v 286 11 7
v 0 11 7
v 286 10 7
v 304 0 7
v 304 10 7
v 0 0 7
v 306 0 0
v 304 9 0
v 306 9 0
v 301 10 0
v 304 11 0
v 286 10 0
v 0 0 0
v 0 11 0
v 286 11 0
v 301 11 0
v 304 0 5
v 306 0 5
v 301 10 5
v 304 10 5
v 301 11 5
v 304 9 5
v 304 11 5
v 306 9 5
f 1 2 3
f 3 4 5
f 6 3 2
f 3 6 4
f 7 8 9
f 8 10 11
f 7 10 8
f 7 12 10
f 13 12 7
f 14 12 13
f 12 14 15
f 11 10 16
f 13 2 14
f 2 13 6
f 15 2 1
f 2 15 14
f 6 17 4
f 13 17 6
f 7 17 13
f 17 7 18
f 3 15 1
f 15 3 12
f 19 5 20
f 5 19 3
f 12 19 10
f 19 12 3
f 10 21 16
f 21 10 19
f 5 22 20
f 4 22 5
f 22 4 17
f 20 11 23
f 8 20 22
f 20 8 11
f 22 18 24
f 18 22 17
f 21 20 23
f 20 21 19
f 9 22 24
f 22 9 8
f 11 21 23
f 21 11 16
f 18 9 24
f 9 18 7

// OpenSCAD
translate([6.5, 5.5, 3.5]) color([0.3846945959716809, 0.27248481749180187, 0.9711494351721061]) cube([13, 11, 7], center=true);
translate([19.5, 5.5, 3.5]) color([0.5646669518865992, 0.22956269737245216, 0.7165492601952248]) cube([13, 11, 7], center=true);
translate([32.5, 5.5, 3.5]) color([0.5466375027642284, 0.2821670936164109, 0.7398695784196249]) cube([13, 11, 7], center=true);
translate([45.5, 5.5, 3.5]) color([0.9015687423954613, 0.06478718309218656, 0.3075184499818515]) cube([13, 11, 7], center=true);
translate([58.5, 5.5, 3.5]) color([0.32730937178137276, 0.373196919474838, 0.48026967262350795]) cube([13, 11, 7], center=true);
translate([71.5, 5.5, 3.5]) color([0.5820603979481933, 0.1372879505883815, 0.015498761483451418]) cube([13, 11, 7], center=true);
translate([84.5, 5.5, 3.5]) color([0.5048497045627587, 0.36698725510709684, 0.6348155217266559]) cube([13, 11, 7], center=true);
translate([97.5, 5.5, 3.5]) color([0.811995686067811, 0.8768405645756486, 0.1552431358080847]) cube([13, 11, 7], center=true);
translate([110.5, 5.5, 3.5]) color([0.1767648869043179, 0.991228648099722, 0.13558077637136434]) cube([13, 11, 7], center=true);
translate([123.5, 5.5, 3.5]) color([0.20650423900368708, 0.9151210693627757, 0.49673738754911745]) cube([13, 11, 7], center=true);
translate([136.5, 5.5, 3.5]) color([0.7672539256192649, 0.969306850533619, 0.23531586477578126]) cube([13, 11, 7], center=true);
translate([149.5, 5.5, 3.5]) color([0.13212860983739783, 0.23368957459901674, 0.38460662479298113]) cube([13, 11, 7], center=true);
translate([162.5, 5.5, 3.5]) color([0.6084990843462054, 0.1325407149567407, 0.4984659545183915]) cube([13, 11, 7], center=true);
translate([175.5, 5.5, 3.5]) color([0.9178662904203972, 0.6160167741323543, 0.02601445858505036]) cube([13, 11, 7], center=true);
translate([188.5, 5.5, 3.5]) color([0.596125612844632, 0.48919913512172475, 0.30869925031539414]) cube([13, 11, 7], center=true);
translate([201.5, 5.5, 3.5]) color([0.9586301909392594, 0.5555224541780607, 0.16303723797834868]) cube([13, 11, 7], center=true);
translate([214.5, 5.5, 3.5]) color([0.8790785483620981, 0.8092366229990562, 0.7373715302416316]) cube([13, 11, 7], center=true);
translate([223.5, 5.5, 3.5]) color([0.5460288399006699, 0.7042240787132147, 0.07877233817546292]) cube([5, 11, 7], center=true);
translate([228.5, 5.5, 3.5]) color([0.13744427713979768, 0.40185422229333856, 0.1910666288561843]) cube([5, 11, 7], center=true);
translate([233.5, 5.5, 3.5]) color([0.31642065037316636, 0.2917281417853558, 0.9437754009602987]) cube([5, 11, 7], center=true);
translate([238.5, 5.5, 3.5]) color([0.20866341172373193, 0.3151573145870893, 0.7470721078045024]) cube([5, 11, 7], center=true);
translate([243.5, 5.5, 3.5]) color([0.24960896628473228, 0.8629627260654799, 0.6684326881602258]) cube([5, 11, 7], center=true);
translate([248.5, 5.5, 3.5]) color([0.6597695027130189, 0.22591717735012307, 0.3441717078654829]) cube([5, 11, 7], center=true);
translate([253.5, 5.5, 3.5]) color([0.16233220178561225, 0.01697652307419406, 0.5735931064152219]) cube([5, 11, 7], center=true);
translate([258.5, 5.5, 3.5]) color([0.05818297514553228, 0.6304378073753134, 0.35341956482818127]) cube([5, 11, 7], center=true);
translate([263.5, 5.5, 3.5]) color([0.49110709598533775, 0.06132304686728618, 0.24146702174069912]) cube([5, 11, 7], center=true);
translate([268.5, 5.5, 3.5]) color([0.012441234482642782, 0.9455344576677447, 0.3266678829978785]) cube([5, 11, 7], center=true);
translate([273.5, 5.5, 3.5]) color([0.820956849026723, 0.34492851027915805, 0.6639756368298299]) cube([5, 11, 7], center=true);
translate([278.5, 5.5, 3.5]) color([0.13585073420724958, 0.9219835342207869, 0.44896684911260887]) cube([5, 11, 7], center=true);
translate([283.5, 5.5, 3.5]) color([0.1420549627992148, 0.3119518323014343, 0.6490756968320398]) cube([5, 11, 7], center=true);
translate([287.5, 2.5, 3.5]) color([0.7280642389267371, 0.7852833252199665, 0.40863068686923587]) cube([3, 5, 7], center=true);
translate([287.5, 7.5, 3.5]) color([0.009633238682779877, 0.8909238596539266, 0.533705581213062]) cube([3, 5, 7], center=true);
translate([290.5, 2.5, 3.5]) color([0.8046005274030336, 0.9806276909012095, 0.7049346898693578]) cube([3, 5, 7], center=true);
translate([290.5, 7.5, 3.5]) color([0.7590860206033218, 0.5647284680717275, 0.12259546226958773]) cube([3, 5, 7], center=true);
translate([293.5, 2.5, 3.5]) color([0.9539533584587191, 0.1713156178825357, 0.5005542720722199]) cube([3, 5, 7], center=true);
translate([293.5, 7.5, 3.5]) color([0.621843985236089, 0.6619765424276485, 0.8400519693824264]) cube([3, 5, 7], center=true);
translate([296.5, 2.5, 3.5]) color([0.699601591737329, 0.07964741684534404, 0.23738047361475634]) cube([3, 5, 7], center=true);
translate([296.5, 7.5, 3.5]) color([0.8282556520451495, 0.1762738246231843, 0.9459581227747745]) cube([3, 5, 7], center=true);
translate([299.5, 2.5, 3.5]) color([0.9565644324307663, 0.8963269305888116, 0.7428117304122551]) cube([3, 5, 7], center=true);
translate([299.5, 7.5, 3.5]) color([0.8383436924491765, 0.5614087817692366, 0.7177928021437573]) cube([3, 5, 7], center=true);
translate([302.5, 2.5, 3.5]) color([0.4271772721979724, 0.8646648421725511, 0.10365846470378459]) cube([3, 5, 7], center=true);
translate([302.5, 6.0, 2.5]) color([0.6285317276232824, 0.7101075213407797, 0.6149371087697887]) cube([3, 2, 5], center=true);
translate([302.5, 8.0, 2.5]) color([0.0400488022899097, 0.34025031183581533, 0.7380159626358669]) cube([3, 2, 5], center=true);
translate([302.5, 10.0, 2.5]) color([0.3765176313166855, 0.6257641682954356, 0.8894786539399329]) cube([3, 2, 5], center=true);
translate([302.5, 7.5, 6.0]) color([0.4963449395419606, 0.3583651728386771, 0.6716454412848432]) cube([3, 5, 2], center=true);
translate([305.0, 1.5, 2.5]) color([0.45811681625355094, 0.5074379917667022, 0.16228475224599026]) cube([2, 3, 5], center=true);
translate([305.0, 4.5, 2.5]) color([0.7529781863444399, 0.3376457636791449, 0.8033239356600728]) cube([2, 3, 5], center=true);
translate([305.0, 7.5, 2.5]) color([0.9444207727357242, 0.014783921172948133, 0.5303420268039528]) cube([2, 3, 5], center=true);
